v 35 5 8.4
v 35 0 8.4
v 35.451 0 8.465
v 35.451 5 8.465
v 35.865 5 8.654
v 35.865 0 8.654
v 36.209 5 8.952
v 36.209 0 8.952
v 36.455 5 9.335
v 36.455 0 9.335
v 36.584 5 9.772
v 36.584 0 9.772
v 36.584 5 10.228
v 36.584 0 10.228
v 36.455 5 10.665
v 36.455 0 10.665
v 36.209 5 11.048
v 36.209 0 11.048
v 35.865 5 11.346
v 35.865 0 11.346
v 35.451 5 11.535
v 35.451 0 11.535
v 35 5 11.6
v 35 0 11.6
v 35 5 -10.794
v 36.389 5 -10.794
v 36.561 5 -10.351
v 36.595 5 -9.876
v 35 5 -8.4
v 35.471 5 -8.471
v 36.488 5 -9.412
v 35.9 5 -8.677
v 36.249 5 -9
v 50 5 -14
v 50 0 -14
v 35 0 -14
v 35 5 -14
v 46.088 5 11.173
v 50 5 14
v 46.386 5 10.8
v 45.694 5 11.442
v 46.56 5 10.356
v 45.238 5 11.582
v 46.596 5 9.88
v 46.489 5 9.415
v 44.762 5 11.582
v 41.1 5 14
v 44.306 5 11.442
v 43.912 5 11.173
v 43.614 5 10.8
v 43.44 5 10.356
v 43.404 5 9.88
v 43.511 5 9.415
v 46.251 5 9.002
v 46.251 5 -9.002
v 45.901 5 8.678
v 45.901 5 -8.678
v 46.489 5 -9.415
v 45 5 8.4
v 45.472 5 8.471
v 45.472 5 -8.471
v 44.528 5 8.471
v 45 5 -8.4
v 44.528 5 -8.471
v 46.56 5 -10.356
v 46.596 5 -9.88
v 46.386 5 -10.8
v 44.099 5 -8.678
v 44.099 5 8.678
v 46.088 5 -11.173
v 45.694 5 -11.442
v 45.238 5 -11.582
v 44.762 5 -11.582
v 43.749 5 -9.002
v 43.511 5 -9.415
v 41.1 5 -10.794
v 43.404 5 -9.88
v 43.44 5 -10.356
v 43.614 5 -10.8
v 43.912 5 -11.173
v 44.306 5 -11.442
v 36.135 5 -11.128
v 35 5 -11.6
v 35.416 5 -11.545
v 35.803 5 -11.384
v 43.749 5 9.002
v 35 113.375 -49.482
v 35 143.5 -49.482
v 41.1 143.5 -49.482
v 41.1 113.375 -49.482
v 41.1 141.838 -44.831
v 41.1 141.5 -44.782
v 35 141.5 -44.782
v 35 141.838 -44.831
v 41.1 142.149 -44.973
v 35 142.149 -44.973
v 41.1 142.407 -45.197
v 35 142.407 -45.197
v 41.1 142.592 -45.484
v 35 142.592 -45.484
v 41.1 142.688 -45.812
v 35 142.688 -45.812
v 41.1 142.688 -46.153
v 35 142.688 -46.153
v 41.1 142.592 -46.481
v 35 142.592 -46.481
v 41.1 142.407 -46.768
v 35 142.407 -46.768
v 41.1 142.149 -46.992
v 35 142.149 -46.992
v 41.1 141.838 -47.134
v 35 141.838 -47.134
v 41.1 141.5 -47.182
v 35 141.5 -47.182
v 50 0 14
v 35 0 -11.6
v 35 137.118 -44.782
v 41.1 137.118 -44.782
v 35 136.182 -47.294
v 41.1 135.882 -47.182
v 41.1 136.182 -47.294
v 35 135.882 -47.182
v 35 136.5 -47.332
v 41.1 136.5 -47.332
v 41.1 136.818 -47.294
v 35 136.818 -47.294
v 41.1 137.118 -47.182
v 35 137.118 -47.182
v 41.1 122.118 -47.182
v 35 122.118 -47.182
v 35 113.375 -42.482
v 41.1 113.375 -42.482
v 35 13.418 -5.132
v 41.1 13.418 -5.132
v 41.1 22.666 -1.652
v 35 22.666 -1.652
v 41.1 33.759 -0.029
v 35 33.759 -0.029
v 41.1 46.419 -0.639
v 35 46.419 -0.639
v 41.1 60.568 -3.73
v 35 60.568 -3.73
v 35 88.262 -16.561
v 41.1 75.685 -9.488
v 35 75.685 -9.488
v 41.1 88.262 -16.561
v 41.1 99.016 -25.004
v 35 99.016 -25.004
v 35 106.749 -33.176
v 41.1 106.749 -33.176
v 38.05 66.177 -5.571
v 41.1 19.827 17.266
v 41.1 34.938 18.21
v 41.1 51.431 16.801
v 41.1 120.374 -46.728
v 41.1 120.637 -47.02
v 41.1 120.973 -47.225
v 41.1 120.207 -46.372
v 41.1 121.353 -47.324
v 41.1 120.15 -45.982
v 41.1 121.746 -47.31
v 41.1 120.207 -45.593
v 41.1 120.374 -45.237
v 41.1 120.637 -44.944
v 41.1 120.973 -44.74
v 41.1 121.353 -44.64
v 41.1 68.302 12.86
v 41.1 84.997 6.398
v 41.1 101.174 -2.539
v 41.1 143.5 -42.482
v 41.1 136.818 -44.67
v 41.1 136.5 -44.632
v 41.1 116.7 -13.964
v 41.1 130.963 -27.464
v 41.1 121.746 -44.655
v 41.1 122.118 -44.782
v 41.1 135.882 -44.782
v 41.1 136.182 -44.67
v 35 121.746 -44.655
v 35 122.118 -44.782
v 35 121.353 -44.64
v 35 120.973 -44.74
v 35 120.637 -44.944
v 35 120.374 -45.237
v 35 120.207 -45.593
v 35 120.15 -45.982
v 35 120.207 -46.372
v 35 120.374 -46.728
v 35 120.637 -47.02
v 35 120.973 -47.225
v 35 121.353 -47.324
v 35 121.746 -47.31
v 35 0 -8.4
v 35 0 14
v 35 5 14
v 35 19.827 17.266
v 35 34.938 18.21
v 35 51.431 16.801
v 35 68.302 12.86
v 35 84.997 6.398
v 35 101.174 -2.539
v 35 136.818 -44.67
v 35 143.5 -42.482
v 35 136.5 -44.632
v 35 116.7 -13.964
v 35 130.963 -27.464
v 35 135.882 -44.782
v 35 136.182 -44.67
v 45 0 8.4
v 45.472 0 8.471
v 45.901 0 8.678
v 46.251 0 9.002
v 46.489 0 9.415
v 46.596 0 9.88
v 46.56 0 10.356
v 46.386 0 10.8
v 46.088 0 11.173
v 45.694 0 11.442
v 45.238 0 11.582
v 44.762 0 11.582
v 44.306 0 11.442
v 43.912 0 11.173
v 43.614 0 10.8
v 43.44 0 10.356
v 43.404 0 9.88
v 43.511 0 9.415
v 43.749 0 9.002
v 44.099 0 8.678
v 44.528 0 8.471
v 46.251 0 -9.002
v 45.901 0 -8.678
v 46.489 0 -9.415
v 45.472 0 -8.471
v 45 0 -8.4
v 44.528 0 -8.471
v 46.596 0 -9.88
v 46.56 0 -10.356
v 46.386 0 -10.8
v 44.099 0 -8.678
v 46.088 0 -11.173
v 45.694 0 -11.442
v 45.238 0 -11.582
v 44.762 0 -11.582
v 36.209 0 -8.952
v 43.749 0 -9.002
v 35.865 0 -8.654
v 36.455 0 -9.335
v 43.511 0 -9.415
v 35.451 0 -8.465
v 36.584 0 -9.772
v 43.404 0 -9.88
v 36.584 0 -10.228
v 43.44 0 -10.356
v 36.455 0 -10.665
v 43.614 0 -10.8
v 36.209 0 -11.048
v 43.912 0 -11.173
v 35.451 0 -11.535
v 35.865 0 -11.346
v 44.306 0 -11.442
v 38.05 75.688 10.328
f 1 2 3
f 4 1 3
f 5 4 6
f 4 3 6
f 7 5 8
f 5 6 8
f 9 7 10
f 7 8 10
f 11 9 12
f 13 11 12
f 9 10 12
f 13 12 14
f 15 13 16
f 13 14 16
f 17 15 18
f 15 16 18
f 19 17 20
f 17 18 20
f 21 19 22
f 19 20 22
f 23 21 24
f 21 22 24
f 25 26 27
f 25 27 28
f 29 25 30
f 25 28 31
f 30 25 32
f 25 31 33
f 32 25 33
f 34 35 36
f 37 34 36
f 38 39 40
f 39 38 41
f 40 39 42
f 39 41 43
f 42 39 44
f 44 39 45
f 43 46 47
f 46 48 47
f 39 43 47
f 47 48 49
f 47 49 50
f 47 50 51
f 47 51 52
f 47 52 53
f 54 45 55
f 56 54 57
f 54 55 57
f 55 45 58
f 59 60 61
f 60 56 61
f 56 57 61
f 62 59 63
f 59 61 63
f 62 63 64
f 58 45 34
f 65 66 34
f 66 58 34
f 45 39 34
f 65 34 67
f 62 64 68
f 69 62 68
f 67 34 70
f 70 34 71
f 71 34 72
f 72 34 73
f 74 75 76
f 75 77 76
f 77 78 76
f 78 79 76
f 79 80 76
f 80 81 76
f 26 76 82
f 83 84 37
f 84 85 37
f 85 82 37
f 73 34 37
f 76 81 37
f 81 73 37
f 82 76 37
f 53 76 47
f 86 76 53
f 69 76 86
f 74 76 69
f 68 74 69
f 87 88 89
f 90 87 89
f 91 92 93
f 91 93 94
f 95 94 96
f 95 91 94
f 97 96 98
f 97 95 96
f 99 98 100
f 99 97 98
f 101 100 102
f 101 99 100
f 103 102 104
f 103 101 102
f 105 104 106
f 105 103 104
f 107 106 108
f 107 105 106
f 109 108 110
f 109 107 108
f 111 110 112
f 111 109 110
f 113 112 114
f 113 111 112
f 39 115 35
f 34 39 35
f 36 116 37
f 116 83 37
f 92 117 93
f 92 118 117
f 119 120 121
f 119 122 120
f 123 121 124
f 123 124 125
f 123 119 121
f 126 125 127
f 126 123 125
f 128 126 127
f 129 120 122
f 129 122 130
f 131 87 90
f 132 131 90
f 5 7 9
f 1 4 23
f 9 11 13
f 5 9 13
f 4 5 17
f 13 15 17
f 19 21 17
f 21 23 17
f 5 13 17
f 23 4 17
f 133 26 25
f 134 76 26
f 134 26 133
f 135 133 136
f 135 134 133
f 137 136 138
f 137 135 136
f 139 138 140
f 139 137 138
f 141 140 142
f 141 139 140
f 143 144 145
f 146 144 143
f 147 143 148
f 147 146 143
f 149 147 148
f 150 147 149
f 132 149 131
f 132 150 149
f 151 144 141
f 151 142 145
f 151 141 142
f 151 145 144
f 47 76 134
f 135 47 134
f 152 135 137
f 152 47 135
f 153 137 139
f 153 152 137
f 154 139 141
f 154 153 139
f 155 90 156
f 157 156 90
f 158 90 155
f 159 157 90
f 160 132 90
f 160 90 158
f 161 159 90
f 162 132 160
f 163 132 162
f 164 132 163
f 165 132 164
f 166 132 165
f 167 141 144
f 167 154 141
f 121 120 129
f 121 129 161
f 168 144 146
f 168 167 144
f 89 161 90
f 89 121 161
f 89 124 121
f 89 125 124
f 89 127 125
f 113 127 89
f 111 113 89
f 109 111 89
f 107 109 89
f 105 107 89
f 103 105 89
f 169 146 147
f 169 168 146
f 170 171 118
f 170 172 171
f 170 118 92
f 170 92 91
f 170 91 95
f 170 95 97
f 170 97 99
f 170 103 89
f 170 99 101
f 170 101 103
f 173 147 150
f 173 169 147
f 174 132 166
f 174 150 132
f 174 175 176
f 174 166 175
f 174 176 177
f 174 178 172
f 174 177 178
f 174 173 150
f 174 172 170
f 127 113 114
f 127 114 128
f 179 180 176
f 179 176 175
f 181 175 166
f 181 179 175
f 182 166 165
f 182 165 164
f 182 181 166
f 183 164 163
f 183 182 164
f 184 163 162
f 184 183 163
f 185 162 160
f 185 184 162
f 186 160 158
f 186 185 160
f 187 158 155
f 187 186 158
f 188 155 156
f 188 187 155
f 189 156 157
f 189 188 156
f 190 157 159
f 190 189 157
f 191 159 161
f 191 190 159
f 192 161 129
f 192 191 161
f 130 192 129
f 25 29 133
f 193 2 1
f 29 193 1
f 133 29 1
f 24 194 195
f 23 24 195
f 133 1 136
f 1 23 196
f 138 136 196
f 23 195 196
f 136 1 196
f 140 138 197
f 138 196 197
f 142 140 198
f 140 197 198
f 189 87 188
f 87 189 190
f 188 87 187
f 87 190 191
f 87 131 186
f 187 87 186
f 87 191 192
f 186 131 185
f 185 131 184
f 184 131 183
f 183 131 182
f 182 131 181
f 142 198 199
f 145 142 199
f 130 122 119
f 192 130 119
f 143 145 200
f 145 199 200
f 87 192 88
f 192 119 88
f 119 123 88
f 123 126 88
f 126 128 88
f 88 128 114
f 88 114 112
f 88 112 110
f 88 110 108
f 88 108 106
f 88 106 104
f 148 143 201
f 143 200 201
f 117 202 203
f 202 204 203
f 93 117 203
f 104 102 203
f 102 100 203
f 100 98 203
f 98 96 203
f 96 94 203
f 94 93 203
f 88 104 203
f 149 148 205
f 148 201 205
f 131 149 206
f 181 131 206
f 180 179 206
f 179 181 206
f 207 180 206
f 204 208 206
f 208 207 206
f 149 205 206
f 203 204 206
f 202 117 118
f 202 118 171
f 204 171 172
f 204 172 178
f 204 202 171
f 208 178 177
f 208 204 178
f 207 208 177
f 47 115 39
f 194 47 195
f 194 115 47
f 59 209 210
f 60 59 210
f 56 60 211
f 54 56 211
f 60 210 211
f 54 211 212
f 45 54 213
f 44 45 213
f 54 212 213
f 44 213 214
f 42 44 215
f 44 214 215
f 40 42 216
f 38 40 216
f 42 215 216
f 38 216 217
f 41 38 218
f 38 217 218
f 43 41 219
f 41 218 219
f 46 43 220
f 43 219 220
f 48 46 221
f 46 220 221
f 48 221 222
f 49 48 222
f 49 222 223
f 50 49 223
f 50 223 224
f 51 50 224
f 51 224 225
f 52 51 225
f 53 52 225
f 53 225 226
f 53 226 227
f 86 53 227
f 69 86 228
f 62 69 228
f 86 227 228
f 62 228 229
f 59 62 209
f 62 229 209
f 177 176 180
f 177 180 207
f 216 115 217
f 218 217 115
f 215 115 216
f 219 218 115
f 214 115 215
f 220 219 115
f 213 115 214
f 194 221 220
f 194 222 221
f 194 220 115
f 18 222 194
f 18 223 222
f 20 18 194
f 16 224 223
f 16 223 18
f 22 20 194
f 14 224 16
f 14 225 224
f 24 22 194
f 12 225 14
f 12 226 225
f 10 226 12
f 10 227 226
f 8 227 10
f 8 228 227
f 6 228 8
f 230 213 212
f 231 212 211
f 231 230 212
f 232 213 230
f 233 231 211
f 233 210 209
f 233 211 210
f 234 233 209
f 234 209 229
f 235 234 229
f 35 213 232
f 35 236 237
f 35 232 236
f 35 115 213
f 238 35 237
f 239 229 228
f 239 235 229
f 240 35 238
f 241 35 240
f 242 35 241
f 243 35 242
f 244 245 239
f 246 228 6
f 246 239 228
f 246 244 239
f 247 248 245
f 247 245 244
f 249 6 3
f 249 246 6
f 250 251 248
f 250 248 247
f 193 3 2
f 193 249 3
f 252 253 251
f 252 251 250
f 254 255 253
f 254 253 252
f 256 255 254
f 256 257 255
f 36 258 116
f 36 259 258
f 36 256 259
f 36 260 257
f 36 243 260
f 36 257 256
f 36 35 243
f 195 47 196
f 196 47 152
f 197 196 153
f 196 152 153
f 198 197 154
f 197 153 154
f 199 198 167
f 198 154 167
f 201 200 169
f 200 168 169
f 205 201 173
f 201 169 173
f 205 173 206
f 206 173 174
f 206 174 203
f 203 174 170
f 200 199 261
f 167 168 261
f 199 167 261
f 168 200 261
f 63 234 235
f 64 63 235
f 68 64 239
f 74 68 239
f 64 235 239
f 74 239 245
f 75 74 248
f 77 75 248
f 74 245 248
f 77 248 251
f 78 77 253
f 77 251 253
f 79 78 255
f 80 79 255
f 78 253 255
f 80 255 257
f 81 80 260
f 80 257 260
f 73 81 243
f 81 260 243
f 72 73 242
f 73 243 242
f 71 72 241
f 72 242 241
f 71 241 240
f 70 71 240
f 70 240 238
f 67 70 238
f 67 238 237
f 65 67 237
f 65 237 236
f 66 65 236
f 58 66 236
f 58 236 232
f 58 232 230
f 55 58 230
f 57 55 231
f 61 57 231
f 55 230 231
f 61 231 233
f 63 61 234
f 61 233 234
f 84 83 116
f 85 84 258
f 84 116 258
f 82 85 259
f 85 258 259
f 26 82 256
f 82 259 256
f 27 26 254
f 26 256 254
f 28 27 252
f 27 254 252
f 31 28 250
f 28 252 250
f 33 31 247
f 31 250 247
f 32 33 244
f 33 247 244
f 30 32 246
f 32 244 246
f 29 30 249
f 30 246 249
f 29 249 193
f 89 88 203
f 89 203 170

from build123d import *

# Parameters (mm, degrees)
SKETCH_1_W           = 20
SKETCH_1_H           = 28
SKETCH_1_R           = 1.6
EXTRUDE_1_DEPTH      = 5
EXTRUDE_2_DEPTH      = 5
EXTRUDE_2_DEPTH_BACK = 1.1
SKETCH_3_W           = 6.1
SKETCH_3_H           = 30.125226912
EXTRUDE_3_DEPTH      = 7
SKETCH_4_R           = 1.35
CUT_EXTRUDE_1_DEPTH  = 7
SKETCH_5_W           = 5
SKETCH_5_H           = 28
CUT_EXTRUDE_2_DEPTH  = 10
CUT_EXTRUDE_3_DEPTH  = 10


with BuildPart() as part:
    # 草图1 → 凸台-拉伸1 (new body)
    with BuildSketch(Plane(origin=(0, 0, 0), x_dir=(1, 0, 0), z_dir=(0, 1, 0))):
        Rectangle(SKETCH_1_W, SKETCH_1_H)
        with Locations(Location((-5, 10, 0), (0, 0, 270))):
            Circle(SKETCH_1_R, mode=Mode.SUBTRACT)
        with Locations(Location((5, 10, 0), (0, 0, 90))):
            Circle(SKETCH_1_R, mode=Mode.SUBTRACT)
        with Locations(Location((5, -10, 0), (0, 0, 270))):
            Circle(SKETCH_1_R, mode=Mode.SUBTRACT)
        with Locations(Location((-5, -10, 0), (0, 0, 90))):
            Circle(SKETCH_1_R, mode=Mode.SUBTRACT)
    extrude(amount=EXTRUDE_1_DEPTH)

    # 草图2 → 凸台-拉伸2 (add, two sides: drawn at the far end of the back side and taken through both)
    with BuildSketch(Plane(origin=(0, 0, 0), x_dir=(0, 0, -1), z_dir=(1, 0, 0)).offset(-EXTRUDE_2_DEPTH_BACK)):
        with BuildLine():
            Line((42.482395746, 143.5), (42.482395746, 113.374773088))
            add(Edge.make_bspline(
                [(10.794309538, 5), (-3.625508376, 21.700163207), (-0.038874902, 68.530494039), (24.786643579, 102.563540472), (42.482395746, 113.374773088)],
                knots=[0, 0, 0, 0, 0.510479212, 1, 1, 1, 1], degree=3))
            Line((10.794309538, 5), (-14, 5))
            add(Edge.make_bspline(
                [(-14, 5), (-21.090980053, 28.072383436), (-16.059602837, 83.599622922), (19.318940175, 126.307389699), (42.482395746, 143.5)],
                knots=[0, 0, 0, 0, 0.452386754, 1, 1, 1, 1], degree=3))
        make_face()
    extrude(amount=EXTRUDE_2_DEPTH + EXTRUDE_2_DEPTH_BACK)

    # 草图3 → 凸台-拉伸3 (add)
    with BuildSketch(Plane(origin=(0, 0, -42.482395746), x_dir=(-1, 0, 0), z_dir=(0, 0, -1))):
        with Locations((-1.95, 128.437386544)):
            Rectangle(SKETCH_3_W, SKETCH_3_H)
    extrude(amount=EXTRUDE_3_DEPTH)

    # 草图4 → 切除-拉伸1 (cut)
    with BuildSketch(Plane(origin=(5, 0, 0), x_dir=(0, 0, -1), z_dir=(1, 0, 0))):
        with Locations((45.982395746, 136.5)):
            Circle(SKETCH_4_R)
        with Locations((45.982395746, 121.5)):
            Circle(SKETCH_4_R)
    extrude(amount=-CUT_EXTRUDE_1_DEPTH, mode=Mode.SUBTRACT)


with BuildPart() as body_2:
    # 镜向1: mirrored copy
    add(part.part.mirror(Plane(origin=(20, 0, 0), x_dir=(0, 0, 1), z_dir=(1, 0, 0))))

    # 草图5 → 切除-拉伸2 (cut)
    with BuildSketch(Plane(origin=(0, 5, 0), x_dir=(1, 0, 0), z_dir=(0, 1, 0))):
        with Locations((32.5, 0)):
            Rectangle(SKETCH_5_W, SKETCH_5_H)
    extrude(amount=-CUT_EXTRUDE_2_DEPTH, mode=Mode.SUBTRACT)

    # 草图6 → 切除-拉伸3 (cut)
    with BuildSketch(Plane(origin=(41.1, 0, 0), x_dir=(0, 0, -1), z_dir=(1, 0, 0))):
        with BuildLine():
            Line((47.182395746, 141.5), (47.182395746, 121.5))
            ThreePointArc((47.182395746, 121.5), (45.982395746, 120.3), (44.782395746, 121.5))
            Line((44.782395746, 121.5), (44.782395746, 141.5))
            ThreePointArc((44.782395746, 141.5), (45.982395746, 142.7), (47.182395746, 141.5))
        make_face()
    extrude(amount=-CUT_EXTRUDE_3_DEPTH, mode=Mode.SUBTRACT)


solid = body_2.part
